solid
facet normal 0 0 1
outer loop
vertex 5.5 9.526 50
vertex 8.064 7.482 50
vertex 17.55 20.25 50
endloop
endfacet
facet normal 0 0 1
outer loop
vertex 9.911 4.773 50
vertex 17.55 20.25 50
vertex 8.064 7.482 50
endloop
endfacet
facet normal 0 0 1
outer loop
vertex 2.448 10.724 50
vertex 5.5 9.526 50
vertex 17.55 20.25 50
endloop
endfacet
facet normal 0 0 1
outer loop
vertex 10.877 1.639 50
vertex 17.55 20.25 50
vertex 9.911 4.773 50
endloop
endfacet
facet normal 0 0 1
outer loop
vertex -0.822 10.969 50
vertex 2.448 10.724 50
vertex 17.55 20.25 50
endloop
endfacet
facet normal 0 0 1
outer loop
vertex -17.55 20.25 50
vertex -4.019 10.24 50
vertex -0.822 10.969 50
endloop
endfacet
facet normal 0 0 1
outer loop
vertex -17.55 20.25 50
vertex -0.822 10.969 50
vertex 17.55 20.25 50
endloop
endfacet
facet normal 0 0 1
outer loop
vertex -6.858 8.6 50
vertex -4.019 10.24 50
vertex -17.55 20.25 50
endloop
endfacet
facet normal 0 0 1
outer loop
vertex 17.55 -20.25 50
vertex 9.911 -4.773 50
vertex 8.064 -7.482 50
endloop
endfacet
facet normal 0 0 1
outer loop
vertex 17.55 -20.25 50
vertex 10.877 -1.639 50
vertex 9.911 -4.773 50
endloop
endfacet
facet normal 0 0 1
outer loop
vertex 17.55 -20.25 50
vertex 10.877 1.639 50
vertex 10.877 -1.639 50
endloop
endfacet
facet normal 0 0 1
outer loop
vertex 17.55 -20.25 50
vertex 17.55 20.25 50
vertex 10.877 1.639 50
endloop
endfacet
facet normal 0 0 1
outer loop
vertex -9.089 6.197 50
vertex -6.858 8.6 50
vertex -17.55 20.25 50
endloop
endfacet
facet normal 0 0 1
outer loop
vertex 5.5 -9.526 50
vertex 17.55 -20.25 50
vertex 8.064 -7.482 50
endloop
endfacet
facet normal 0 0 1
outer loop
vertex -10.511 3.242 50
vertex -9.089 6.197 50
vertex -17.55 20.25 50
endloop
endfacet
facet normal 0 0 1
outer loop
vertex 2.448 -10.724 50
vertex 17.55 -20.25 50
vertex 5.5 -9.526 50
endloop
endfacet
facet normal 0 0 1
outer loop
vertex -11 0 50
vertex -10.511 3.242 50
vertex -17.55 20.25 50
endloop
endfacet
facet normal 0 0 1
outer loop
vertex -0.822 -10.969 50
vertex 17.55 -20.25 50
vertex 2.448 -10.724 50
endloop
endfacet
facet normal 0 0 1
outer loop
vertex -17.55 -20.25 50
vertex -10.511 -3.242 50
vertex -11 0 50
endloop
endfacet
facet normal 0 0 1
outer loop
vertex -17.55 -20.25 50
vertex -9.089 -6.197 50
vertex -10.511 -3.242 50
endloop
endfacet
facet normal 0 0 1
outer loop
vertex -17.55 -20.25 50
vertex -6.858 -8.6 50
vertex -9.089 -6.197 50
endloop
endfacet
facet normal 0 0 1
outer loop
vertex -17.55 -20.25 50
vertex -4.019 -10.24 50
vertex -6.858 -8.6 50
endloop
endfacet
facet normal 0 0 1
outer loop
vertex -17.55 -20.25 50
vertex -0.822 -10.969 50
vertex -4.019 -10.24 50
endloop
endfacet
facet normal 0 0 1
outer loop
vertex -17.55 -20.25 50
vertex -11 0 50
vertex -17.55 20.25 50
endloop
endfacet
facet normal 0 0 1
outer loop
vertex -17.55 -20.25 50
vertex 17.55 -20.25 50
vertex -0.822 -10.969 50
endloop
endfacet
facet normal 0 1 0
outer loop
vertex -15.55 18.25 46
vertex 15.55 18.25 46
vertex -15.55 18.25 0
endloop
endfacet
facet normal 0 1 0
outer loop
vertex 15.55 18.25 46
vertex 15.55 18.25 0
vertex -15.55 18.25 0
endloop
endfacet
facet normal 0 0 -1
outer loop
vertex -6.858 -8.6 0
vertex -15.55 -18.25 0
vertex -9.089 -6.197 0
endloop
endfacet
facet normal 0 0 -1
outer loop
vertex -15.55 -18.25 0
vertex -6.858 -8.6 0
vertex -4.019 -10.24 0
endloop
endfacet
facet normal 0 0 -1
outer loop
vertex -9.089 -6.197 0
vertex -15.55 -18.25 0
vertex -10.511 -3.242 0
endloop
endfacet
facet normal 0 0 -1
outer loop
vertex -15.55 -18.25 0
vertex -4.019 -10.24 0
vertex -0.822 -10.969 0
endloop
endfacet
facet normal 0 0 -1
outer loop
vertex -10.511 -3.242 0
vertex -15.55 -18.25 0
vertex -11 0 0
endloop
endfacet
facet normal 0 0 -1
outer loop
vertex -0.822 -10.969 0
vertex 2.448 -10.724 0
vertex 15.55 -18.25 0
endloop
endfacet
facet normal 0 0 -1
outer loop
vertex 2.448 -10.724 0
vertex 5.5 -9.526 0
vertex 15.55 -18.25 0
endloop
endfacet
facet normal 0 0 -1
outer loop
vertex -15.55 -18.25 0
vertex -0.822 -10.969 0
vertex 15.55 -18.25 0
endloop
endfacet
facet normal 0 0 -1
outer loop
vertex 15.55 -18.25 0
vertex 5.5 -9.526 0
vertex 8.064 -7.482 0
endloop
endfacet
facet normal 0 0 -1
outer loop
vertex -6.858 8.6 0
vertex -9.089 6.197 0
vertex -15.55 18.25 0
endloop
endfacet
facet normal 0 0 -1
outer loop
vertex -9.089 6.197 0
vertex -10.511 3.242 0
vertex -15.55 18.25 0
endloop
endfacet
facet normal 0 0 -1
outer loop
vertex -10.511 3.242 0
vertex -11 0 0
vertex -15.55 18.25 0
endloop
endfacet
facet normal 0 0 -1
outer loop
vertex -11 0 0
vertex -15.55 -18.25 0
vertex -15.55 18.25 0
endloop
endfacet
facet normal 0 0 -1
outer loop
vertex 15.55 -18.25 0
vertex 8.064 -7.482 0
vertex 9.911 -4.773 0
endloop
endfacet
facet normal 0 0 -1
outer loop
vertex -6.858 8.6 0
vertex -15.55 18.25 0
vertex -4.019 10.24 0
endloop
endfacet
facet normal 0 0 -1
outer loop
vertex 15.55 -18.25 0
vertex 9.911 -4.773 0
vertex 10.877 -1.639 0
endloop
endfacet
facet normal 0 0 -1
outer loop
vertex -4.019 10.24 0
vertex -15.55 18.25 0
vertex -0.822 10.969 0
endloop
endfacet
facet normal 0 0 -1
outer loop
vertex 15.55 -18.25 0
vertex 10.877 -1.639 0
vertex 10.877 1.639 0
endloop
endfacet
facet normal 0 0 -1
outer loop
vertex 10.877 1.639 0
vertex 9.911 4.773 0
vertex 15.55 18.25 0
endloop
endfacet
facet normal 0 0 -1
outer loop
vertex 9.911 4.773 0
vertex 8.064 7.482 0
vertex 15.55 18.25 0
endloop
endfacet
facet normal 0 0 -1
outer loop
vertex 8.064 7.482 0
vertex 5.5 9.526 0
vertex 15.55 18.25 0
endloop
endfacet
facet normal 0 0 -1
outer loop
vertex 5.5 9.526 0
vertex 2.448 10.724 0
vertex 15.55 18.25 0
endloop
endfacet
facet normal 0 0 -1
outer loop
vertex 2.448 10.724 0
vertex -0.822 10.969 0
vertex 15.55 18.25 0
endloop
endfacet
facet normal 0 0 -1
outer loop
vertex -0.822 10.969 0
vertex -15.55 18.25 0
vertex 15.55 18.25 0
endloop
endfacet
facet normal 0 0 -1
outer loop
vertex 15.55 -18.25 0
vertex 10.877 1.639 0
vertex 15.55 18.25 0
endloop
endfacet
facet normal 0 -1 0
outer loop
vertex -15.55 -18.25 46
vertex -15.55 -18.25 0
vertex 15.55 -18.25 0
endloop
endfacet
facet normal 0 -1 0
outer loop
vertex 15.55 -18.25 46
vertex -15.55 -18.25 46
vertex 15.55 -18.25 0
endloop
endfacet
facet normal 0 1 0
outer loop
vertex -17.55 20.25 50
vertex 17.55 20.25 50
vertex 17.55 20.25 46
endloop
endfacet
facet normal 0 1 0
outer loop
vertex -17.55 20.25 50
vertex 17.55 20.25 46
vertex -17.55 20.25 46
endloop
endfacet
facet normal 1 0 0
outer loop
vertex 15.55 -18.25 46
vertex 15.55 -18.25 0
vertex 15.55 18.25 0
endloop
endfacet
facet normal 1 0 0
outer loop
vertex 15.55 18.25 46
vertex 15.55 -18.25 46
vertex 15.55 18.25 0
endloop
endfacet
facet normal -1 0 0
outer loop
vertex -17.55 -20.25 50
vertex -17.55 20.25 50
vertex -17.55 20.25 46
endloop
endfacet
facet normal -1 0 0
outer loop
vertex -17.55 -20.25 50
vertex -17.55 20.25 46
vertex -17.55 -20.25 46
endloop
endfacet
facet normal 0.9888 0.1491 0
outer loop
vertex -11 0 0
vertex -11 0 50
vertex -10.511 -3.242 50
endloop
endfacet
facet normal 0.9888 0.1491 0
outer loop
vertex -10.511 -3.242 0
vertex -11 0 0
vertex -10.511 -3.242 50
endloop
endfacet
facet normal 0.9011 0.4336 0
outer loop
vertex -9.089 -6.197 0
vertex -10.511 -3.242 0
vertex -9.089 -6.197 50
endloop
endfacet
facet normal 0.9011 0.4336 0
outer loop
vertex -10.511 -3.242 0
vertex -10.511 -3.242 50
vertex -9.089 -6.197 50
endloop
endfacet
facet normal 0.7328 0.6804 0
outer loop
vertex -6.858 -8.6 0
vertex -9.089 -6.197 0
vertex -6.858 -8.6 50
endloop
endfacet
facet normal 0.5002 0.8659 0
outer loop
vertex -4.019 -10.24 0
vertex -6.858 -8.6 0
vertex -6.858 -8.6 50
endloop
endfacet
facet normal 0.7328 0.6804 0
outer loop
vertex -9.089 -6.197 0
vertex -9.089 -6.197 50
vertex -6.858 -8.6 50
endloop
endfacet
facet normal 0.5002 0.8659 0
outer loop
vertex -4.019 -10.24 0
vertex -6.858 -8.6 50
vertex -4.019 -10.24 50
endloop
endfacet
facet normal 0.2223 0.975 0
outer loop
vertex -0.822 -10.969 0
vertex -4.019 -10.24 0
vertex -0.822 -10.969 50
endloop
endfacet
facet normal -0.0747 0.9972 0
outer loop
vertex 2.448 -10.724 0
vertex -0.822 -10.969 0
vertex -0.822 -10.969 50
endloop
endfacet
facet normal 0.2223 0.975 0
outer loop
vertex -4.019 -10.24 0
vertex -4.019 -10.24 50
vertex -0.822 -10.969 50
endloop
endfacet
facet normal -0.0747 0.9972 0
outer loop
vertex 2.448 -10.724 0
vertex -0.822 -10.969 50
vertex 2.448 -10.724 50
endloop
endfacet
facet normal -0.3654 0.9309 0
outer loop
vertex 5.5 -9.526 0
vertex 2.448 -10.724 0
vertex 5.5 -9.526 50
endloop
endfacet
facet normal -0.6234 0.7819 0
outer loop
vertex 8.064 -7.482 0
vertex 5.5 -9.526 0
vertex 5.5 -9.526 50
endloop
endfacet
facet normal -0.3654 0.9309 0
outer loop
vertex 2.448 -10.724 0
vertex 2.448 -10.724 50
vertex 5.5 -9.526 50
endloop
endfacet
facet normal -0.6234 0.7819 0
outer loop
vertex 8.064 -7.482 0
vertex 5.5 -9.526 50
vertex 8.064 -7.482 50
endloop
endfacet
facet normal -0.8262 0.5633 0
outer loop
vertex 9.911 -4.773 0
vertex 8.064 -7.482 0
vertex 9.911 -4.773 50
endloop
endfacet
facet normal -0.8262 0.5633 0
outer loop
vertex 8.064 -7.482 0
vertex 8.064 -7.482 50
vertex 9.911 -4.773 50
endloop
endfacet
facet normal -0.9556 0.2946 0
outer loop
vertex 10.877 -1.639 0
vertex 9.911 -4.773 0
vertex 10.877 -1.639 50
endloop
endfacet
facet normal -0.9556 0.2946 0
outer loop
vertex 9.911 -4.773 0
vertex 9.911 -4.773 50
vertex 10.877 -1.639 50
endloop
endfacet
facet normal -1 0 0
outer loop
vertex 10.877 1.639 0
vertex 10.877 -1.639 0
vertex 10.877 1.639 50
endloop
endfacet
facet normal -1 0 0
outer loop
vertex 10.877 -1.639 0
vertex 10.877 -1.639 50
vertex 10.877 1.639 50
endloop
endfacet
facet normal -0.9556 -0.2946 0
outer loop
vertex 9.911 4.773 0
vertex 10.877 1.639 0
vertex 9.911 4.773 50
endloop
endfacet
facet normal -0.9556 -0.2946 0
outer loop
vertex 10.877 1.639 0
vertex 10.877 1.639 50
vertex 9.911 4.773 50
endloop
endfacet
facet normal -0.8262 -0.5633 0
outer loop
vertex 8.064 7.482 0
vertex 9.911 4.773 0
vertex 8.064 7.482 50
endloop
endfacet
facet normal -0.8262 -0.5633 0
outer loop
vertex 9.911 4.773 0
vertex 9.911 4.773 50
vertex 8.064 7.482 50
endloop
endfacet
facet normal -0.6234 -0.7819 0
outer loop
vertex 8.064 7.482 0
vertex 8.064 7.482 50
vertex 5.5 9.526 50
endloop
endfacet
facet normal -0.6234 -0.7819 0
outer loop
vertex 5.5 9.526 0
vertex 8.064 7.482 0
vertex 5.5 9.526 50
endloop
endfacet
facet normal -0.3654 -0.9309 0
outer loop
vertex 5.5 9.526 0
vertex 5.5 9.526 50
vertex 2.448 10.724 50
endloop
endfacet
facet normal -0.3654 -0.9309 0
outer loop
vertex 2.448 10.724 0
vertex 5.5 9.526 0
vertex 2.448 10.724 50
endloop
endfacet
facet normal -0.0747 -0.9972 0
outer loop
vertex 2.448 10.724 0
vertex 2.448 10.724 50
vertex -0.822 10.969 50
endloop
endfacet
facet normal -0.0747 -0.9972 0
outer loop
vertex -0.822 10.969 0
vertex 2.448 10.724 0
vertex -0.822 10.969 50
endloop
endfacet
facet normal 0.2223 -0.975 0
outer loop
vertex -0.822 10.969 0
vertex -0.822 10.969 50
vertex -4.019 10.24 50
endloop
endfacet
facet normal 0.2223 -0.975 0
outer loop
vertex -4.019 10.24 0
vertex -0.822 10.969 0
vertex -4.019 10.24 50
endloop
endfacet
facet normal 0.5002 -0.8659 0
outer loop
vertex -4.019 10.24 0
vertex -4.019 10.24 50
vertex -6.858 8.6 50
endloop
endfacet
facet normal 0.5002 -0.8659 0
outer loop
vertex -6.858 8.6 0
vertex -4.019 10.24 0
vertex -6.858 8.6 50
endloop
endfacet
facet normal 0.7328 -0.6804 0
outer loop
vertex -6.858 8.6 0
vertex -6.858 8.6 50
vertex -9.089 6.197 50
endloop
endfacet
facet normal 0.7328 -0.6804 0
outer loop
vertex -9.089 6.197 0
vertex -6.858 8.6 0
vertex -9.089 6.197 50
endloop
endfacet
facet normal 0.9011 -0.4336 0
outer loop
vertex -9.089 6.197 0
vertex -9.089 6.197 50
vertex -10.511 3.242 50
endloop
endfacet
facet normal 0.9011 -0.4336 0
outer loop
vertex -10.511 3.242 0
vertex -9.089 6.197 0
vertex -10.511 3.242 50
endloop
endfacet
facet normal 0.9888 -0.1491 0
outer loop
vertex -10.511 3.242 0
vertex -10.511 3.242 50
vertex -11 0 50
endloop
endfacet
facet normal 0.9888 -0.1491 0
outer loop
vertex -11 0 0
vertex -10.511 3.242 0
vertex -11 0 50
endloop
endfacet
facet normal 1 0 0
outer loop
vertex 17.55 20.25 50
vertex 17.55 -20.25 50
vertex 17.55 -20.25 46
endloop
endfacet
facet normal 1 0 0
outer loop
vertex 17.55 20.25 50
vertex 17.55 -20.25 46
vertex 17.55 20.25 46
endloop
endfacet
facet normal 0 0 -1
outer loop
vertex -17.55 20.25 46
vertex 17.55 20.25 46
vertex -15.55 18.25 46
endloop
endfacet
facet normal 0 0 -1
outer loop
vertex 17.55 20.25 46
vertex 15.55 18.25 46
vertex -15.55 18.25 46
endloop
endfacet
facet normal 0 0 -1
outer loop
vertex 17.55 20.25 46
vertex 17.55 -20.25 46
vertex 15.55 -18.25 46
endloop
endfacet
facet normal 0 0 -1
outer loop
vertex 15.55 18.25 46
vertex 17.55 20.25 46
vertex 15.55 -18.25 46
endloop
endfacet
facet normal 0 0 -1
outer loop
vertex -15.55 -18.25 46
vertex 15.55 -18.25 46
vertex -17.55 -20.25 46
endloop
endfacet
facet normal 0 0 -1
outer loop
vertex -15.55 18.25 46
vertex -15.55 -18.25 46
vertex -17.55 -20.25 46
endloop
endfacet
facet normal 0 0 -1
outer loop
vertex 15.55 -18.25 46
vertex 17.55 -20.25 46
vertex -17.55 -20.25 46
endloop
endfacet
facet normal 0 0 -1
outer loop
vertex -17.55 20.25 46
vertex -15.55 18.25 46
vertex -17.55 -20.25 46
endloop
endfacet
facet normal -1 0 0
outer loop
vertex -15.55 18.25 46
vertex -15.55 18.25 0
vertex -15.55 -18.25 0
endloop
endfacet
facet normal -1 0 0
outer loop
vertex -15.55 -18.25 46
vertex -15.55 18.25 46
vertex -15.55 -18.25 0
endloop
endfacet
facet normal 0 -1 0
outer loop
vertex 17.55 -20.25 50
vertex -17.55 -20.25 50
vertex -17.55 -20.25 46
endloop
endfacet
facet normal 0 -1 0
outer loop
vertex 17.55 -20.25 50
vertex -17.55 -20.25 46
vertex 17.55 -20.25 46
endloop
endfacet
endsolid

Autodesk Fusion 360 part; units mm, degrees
sketch "Sketch1" plane through (0, 0, 0) normal (0, 0, 1) x (1, 0, 0)
  line L0 (15.55, 18.25) -> (-15.55, 18.25)
  line L1 (-15.55, 18.25) -> (-15.55, -18.25)
  line L2 (-15.55, -18.25) -> (15.55, -18.25)
  line L3 (15.55, -18.25) -> (15.55, 18.25)
  line L4 (15.55, 18.25) -> (-15.55, -18.25) construction
  line L5 (-15.55, 18.25) -> (15.55, -18.25) construction
  dimension "d1" = 31.1
  dimension "d2" = 36.5
extrude "Extrude1" add sketch "Sketch1" along normal blind 50
sketch "Sketch2" plane through (0, 0, 50) normal (0, 0, 1) x (-1, 0, 0)
  line L0 (-15.55, 18.25) -> (-15.55, -18.25)
  line L1 (-15.55, -18.25) -> (15.55, -18.25)
  line L2 (15.55, -18.25) -> (15.55, 18.25)
  line L3 (15.55, 18.25) -> (-15.55, 18.25)
  circle A0 centre (0, 0) radius 11
  dimension "d5" = 22
extrude "Extrude2" cut sketch "Sketch2" against normal blind 16 contours A0
extrude "Extrude3" cut 1 faces at (-2.9076, 1.5312, 34) along direction (0, 0, -1) blind 69.898
sketch "Sketch3" plane through (0, 0, 50) normal (0, 0, 1) x (-1, 0, 0)
  circle A0 centre (0, 0) radius 11
  line L0 (-15.55, 18.25) -> (-15.55, -18.25)
  line L1 (-15.55, -18.25) -> (15.55, -18.25)
  line L2 (15.55, -18.25) -> (15.55, 18.25)
  line L3 (15.55, 18.25) -> (-15.55, 18.25)
  line L4 (-17.55, -20.25) -> (17.55, -20.25)
  line L5 (17.55, -20.25) -> (17.55, 20.25)
  line L6 (17.55, 20.25) -> (-17.55, 20.25)
  line L7 (-17.55, 20.25) -> (-17.55, -20.25)
  dimension "d10" = 2
extrude "Extrude4" add sketch "Sketch3" against normal blind 4 contours L0 L1 L2 L3 | L4 L5 L6 L7
